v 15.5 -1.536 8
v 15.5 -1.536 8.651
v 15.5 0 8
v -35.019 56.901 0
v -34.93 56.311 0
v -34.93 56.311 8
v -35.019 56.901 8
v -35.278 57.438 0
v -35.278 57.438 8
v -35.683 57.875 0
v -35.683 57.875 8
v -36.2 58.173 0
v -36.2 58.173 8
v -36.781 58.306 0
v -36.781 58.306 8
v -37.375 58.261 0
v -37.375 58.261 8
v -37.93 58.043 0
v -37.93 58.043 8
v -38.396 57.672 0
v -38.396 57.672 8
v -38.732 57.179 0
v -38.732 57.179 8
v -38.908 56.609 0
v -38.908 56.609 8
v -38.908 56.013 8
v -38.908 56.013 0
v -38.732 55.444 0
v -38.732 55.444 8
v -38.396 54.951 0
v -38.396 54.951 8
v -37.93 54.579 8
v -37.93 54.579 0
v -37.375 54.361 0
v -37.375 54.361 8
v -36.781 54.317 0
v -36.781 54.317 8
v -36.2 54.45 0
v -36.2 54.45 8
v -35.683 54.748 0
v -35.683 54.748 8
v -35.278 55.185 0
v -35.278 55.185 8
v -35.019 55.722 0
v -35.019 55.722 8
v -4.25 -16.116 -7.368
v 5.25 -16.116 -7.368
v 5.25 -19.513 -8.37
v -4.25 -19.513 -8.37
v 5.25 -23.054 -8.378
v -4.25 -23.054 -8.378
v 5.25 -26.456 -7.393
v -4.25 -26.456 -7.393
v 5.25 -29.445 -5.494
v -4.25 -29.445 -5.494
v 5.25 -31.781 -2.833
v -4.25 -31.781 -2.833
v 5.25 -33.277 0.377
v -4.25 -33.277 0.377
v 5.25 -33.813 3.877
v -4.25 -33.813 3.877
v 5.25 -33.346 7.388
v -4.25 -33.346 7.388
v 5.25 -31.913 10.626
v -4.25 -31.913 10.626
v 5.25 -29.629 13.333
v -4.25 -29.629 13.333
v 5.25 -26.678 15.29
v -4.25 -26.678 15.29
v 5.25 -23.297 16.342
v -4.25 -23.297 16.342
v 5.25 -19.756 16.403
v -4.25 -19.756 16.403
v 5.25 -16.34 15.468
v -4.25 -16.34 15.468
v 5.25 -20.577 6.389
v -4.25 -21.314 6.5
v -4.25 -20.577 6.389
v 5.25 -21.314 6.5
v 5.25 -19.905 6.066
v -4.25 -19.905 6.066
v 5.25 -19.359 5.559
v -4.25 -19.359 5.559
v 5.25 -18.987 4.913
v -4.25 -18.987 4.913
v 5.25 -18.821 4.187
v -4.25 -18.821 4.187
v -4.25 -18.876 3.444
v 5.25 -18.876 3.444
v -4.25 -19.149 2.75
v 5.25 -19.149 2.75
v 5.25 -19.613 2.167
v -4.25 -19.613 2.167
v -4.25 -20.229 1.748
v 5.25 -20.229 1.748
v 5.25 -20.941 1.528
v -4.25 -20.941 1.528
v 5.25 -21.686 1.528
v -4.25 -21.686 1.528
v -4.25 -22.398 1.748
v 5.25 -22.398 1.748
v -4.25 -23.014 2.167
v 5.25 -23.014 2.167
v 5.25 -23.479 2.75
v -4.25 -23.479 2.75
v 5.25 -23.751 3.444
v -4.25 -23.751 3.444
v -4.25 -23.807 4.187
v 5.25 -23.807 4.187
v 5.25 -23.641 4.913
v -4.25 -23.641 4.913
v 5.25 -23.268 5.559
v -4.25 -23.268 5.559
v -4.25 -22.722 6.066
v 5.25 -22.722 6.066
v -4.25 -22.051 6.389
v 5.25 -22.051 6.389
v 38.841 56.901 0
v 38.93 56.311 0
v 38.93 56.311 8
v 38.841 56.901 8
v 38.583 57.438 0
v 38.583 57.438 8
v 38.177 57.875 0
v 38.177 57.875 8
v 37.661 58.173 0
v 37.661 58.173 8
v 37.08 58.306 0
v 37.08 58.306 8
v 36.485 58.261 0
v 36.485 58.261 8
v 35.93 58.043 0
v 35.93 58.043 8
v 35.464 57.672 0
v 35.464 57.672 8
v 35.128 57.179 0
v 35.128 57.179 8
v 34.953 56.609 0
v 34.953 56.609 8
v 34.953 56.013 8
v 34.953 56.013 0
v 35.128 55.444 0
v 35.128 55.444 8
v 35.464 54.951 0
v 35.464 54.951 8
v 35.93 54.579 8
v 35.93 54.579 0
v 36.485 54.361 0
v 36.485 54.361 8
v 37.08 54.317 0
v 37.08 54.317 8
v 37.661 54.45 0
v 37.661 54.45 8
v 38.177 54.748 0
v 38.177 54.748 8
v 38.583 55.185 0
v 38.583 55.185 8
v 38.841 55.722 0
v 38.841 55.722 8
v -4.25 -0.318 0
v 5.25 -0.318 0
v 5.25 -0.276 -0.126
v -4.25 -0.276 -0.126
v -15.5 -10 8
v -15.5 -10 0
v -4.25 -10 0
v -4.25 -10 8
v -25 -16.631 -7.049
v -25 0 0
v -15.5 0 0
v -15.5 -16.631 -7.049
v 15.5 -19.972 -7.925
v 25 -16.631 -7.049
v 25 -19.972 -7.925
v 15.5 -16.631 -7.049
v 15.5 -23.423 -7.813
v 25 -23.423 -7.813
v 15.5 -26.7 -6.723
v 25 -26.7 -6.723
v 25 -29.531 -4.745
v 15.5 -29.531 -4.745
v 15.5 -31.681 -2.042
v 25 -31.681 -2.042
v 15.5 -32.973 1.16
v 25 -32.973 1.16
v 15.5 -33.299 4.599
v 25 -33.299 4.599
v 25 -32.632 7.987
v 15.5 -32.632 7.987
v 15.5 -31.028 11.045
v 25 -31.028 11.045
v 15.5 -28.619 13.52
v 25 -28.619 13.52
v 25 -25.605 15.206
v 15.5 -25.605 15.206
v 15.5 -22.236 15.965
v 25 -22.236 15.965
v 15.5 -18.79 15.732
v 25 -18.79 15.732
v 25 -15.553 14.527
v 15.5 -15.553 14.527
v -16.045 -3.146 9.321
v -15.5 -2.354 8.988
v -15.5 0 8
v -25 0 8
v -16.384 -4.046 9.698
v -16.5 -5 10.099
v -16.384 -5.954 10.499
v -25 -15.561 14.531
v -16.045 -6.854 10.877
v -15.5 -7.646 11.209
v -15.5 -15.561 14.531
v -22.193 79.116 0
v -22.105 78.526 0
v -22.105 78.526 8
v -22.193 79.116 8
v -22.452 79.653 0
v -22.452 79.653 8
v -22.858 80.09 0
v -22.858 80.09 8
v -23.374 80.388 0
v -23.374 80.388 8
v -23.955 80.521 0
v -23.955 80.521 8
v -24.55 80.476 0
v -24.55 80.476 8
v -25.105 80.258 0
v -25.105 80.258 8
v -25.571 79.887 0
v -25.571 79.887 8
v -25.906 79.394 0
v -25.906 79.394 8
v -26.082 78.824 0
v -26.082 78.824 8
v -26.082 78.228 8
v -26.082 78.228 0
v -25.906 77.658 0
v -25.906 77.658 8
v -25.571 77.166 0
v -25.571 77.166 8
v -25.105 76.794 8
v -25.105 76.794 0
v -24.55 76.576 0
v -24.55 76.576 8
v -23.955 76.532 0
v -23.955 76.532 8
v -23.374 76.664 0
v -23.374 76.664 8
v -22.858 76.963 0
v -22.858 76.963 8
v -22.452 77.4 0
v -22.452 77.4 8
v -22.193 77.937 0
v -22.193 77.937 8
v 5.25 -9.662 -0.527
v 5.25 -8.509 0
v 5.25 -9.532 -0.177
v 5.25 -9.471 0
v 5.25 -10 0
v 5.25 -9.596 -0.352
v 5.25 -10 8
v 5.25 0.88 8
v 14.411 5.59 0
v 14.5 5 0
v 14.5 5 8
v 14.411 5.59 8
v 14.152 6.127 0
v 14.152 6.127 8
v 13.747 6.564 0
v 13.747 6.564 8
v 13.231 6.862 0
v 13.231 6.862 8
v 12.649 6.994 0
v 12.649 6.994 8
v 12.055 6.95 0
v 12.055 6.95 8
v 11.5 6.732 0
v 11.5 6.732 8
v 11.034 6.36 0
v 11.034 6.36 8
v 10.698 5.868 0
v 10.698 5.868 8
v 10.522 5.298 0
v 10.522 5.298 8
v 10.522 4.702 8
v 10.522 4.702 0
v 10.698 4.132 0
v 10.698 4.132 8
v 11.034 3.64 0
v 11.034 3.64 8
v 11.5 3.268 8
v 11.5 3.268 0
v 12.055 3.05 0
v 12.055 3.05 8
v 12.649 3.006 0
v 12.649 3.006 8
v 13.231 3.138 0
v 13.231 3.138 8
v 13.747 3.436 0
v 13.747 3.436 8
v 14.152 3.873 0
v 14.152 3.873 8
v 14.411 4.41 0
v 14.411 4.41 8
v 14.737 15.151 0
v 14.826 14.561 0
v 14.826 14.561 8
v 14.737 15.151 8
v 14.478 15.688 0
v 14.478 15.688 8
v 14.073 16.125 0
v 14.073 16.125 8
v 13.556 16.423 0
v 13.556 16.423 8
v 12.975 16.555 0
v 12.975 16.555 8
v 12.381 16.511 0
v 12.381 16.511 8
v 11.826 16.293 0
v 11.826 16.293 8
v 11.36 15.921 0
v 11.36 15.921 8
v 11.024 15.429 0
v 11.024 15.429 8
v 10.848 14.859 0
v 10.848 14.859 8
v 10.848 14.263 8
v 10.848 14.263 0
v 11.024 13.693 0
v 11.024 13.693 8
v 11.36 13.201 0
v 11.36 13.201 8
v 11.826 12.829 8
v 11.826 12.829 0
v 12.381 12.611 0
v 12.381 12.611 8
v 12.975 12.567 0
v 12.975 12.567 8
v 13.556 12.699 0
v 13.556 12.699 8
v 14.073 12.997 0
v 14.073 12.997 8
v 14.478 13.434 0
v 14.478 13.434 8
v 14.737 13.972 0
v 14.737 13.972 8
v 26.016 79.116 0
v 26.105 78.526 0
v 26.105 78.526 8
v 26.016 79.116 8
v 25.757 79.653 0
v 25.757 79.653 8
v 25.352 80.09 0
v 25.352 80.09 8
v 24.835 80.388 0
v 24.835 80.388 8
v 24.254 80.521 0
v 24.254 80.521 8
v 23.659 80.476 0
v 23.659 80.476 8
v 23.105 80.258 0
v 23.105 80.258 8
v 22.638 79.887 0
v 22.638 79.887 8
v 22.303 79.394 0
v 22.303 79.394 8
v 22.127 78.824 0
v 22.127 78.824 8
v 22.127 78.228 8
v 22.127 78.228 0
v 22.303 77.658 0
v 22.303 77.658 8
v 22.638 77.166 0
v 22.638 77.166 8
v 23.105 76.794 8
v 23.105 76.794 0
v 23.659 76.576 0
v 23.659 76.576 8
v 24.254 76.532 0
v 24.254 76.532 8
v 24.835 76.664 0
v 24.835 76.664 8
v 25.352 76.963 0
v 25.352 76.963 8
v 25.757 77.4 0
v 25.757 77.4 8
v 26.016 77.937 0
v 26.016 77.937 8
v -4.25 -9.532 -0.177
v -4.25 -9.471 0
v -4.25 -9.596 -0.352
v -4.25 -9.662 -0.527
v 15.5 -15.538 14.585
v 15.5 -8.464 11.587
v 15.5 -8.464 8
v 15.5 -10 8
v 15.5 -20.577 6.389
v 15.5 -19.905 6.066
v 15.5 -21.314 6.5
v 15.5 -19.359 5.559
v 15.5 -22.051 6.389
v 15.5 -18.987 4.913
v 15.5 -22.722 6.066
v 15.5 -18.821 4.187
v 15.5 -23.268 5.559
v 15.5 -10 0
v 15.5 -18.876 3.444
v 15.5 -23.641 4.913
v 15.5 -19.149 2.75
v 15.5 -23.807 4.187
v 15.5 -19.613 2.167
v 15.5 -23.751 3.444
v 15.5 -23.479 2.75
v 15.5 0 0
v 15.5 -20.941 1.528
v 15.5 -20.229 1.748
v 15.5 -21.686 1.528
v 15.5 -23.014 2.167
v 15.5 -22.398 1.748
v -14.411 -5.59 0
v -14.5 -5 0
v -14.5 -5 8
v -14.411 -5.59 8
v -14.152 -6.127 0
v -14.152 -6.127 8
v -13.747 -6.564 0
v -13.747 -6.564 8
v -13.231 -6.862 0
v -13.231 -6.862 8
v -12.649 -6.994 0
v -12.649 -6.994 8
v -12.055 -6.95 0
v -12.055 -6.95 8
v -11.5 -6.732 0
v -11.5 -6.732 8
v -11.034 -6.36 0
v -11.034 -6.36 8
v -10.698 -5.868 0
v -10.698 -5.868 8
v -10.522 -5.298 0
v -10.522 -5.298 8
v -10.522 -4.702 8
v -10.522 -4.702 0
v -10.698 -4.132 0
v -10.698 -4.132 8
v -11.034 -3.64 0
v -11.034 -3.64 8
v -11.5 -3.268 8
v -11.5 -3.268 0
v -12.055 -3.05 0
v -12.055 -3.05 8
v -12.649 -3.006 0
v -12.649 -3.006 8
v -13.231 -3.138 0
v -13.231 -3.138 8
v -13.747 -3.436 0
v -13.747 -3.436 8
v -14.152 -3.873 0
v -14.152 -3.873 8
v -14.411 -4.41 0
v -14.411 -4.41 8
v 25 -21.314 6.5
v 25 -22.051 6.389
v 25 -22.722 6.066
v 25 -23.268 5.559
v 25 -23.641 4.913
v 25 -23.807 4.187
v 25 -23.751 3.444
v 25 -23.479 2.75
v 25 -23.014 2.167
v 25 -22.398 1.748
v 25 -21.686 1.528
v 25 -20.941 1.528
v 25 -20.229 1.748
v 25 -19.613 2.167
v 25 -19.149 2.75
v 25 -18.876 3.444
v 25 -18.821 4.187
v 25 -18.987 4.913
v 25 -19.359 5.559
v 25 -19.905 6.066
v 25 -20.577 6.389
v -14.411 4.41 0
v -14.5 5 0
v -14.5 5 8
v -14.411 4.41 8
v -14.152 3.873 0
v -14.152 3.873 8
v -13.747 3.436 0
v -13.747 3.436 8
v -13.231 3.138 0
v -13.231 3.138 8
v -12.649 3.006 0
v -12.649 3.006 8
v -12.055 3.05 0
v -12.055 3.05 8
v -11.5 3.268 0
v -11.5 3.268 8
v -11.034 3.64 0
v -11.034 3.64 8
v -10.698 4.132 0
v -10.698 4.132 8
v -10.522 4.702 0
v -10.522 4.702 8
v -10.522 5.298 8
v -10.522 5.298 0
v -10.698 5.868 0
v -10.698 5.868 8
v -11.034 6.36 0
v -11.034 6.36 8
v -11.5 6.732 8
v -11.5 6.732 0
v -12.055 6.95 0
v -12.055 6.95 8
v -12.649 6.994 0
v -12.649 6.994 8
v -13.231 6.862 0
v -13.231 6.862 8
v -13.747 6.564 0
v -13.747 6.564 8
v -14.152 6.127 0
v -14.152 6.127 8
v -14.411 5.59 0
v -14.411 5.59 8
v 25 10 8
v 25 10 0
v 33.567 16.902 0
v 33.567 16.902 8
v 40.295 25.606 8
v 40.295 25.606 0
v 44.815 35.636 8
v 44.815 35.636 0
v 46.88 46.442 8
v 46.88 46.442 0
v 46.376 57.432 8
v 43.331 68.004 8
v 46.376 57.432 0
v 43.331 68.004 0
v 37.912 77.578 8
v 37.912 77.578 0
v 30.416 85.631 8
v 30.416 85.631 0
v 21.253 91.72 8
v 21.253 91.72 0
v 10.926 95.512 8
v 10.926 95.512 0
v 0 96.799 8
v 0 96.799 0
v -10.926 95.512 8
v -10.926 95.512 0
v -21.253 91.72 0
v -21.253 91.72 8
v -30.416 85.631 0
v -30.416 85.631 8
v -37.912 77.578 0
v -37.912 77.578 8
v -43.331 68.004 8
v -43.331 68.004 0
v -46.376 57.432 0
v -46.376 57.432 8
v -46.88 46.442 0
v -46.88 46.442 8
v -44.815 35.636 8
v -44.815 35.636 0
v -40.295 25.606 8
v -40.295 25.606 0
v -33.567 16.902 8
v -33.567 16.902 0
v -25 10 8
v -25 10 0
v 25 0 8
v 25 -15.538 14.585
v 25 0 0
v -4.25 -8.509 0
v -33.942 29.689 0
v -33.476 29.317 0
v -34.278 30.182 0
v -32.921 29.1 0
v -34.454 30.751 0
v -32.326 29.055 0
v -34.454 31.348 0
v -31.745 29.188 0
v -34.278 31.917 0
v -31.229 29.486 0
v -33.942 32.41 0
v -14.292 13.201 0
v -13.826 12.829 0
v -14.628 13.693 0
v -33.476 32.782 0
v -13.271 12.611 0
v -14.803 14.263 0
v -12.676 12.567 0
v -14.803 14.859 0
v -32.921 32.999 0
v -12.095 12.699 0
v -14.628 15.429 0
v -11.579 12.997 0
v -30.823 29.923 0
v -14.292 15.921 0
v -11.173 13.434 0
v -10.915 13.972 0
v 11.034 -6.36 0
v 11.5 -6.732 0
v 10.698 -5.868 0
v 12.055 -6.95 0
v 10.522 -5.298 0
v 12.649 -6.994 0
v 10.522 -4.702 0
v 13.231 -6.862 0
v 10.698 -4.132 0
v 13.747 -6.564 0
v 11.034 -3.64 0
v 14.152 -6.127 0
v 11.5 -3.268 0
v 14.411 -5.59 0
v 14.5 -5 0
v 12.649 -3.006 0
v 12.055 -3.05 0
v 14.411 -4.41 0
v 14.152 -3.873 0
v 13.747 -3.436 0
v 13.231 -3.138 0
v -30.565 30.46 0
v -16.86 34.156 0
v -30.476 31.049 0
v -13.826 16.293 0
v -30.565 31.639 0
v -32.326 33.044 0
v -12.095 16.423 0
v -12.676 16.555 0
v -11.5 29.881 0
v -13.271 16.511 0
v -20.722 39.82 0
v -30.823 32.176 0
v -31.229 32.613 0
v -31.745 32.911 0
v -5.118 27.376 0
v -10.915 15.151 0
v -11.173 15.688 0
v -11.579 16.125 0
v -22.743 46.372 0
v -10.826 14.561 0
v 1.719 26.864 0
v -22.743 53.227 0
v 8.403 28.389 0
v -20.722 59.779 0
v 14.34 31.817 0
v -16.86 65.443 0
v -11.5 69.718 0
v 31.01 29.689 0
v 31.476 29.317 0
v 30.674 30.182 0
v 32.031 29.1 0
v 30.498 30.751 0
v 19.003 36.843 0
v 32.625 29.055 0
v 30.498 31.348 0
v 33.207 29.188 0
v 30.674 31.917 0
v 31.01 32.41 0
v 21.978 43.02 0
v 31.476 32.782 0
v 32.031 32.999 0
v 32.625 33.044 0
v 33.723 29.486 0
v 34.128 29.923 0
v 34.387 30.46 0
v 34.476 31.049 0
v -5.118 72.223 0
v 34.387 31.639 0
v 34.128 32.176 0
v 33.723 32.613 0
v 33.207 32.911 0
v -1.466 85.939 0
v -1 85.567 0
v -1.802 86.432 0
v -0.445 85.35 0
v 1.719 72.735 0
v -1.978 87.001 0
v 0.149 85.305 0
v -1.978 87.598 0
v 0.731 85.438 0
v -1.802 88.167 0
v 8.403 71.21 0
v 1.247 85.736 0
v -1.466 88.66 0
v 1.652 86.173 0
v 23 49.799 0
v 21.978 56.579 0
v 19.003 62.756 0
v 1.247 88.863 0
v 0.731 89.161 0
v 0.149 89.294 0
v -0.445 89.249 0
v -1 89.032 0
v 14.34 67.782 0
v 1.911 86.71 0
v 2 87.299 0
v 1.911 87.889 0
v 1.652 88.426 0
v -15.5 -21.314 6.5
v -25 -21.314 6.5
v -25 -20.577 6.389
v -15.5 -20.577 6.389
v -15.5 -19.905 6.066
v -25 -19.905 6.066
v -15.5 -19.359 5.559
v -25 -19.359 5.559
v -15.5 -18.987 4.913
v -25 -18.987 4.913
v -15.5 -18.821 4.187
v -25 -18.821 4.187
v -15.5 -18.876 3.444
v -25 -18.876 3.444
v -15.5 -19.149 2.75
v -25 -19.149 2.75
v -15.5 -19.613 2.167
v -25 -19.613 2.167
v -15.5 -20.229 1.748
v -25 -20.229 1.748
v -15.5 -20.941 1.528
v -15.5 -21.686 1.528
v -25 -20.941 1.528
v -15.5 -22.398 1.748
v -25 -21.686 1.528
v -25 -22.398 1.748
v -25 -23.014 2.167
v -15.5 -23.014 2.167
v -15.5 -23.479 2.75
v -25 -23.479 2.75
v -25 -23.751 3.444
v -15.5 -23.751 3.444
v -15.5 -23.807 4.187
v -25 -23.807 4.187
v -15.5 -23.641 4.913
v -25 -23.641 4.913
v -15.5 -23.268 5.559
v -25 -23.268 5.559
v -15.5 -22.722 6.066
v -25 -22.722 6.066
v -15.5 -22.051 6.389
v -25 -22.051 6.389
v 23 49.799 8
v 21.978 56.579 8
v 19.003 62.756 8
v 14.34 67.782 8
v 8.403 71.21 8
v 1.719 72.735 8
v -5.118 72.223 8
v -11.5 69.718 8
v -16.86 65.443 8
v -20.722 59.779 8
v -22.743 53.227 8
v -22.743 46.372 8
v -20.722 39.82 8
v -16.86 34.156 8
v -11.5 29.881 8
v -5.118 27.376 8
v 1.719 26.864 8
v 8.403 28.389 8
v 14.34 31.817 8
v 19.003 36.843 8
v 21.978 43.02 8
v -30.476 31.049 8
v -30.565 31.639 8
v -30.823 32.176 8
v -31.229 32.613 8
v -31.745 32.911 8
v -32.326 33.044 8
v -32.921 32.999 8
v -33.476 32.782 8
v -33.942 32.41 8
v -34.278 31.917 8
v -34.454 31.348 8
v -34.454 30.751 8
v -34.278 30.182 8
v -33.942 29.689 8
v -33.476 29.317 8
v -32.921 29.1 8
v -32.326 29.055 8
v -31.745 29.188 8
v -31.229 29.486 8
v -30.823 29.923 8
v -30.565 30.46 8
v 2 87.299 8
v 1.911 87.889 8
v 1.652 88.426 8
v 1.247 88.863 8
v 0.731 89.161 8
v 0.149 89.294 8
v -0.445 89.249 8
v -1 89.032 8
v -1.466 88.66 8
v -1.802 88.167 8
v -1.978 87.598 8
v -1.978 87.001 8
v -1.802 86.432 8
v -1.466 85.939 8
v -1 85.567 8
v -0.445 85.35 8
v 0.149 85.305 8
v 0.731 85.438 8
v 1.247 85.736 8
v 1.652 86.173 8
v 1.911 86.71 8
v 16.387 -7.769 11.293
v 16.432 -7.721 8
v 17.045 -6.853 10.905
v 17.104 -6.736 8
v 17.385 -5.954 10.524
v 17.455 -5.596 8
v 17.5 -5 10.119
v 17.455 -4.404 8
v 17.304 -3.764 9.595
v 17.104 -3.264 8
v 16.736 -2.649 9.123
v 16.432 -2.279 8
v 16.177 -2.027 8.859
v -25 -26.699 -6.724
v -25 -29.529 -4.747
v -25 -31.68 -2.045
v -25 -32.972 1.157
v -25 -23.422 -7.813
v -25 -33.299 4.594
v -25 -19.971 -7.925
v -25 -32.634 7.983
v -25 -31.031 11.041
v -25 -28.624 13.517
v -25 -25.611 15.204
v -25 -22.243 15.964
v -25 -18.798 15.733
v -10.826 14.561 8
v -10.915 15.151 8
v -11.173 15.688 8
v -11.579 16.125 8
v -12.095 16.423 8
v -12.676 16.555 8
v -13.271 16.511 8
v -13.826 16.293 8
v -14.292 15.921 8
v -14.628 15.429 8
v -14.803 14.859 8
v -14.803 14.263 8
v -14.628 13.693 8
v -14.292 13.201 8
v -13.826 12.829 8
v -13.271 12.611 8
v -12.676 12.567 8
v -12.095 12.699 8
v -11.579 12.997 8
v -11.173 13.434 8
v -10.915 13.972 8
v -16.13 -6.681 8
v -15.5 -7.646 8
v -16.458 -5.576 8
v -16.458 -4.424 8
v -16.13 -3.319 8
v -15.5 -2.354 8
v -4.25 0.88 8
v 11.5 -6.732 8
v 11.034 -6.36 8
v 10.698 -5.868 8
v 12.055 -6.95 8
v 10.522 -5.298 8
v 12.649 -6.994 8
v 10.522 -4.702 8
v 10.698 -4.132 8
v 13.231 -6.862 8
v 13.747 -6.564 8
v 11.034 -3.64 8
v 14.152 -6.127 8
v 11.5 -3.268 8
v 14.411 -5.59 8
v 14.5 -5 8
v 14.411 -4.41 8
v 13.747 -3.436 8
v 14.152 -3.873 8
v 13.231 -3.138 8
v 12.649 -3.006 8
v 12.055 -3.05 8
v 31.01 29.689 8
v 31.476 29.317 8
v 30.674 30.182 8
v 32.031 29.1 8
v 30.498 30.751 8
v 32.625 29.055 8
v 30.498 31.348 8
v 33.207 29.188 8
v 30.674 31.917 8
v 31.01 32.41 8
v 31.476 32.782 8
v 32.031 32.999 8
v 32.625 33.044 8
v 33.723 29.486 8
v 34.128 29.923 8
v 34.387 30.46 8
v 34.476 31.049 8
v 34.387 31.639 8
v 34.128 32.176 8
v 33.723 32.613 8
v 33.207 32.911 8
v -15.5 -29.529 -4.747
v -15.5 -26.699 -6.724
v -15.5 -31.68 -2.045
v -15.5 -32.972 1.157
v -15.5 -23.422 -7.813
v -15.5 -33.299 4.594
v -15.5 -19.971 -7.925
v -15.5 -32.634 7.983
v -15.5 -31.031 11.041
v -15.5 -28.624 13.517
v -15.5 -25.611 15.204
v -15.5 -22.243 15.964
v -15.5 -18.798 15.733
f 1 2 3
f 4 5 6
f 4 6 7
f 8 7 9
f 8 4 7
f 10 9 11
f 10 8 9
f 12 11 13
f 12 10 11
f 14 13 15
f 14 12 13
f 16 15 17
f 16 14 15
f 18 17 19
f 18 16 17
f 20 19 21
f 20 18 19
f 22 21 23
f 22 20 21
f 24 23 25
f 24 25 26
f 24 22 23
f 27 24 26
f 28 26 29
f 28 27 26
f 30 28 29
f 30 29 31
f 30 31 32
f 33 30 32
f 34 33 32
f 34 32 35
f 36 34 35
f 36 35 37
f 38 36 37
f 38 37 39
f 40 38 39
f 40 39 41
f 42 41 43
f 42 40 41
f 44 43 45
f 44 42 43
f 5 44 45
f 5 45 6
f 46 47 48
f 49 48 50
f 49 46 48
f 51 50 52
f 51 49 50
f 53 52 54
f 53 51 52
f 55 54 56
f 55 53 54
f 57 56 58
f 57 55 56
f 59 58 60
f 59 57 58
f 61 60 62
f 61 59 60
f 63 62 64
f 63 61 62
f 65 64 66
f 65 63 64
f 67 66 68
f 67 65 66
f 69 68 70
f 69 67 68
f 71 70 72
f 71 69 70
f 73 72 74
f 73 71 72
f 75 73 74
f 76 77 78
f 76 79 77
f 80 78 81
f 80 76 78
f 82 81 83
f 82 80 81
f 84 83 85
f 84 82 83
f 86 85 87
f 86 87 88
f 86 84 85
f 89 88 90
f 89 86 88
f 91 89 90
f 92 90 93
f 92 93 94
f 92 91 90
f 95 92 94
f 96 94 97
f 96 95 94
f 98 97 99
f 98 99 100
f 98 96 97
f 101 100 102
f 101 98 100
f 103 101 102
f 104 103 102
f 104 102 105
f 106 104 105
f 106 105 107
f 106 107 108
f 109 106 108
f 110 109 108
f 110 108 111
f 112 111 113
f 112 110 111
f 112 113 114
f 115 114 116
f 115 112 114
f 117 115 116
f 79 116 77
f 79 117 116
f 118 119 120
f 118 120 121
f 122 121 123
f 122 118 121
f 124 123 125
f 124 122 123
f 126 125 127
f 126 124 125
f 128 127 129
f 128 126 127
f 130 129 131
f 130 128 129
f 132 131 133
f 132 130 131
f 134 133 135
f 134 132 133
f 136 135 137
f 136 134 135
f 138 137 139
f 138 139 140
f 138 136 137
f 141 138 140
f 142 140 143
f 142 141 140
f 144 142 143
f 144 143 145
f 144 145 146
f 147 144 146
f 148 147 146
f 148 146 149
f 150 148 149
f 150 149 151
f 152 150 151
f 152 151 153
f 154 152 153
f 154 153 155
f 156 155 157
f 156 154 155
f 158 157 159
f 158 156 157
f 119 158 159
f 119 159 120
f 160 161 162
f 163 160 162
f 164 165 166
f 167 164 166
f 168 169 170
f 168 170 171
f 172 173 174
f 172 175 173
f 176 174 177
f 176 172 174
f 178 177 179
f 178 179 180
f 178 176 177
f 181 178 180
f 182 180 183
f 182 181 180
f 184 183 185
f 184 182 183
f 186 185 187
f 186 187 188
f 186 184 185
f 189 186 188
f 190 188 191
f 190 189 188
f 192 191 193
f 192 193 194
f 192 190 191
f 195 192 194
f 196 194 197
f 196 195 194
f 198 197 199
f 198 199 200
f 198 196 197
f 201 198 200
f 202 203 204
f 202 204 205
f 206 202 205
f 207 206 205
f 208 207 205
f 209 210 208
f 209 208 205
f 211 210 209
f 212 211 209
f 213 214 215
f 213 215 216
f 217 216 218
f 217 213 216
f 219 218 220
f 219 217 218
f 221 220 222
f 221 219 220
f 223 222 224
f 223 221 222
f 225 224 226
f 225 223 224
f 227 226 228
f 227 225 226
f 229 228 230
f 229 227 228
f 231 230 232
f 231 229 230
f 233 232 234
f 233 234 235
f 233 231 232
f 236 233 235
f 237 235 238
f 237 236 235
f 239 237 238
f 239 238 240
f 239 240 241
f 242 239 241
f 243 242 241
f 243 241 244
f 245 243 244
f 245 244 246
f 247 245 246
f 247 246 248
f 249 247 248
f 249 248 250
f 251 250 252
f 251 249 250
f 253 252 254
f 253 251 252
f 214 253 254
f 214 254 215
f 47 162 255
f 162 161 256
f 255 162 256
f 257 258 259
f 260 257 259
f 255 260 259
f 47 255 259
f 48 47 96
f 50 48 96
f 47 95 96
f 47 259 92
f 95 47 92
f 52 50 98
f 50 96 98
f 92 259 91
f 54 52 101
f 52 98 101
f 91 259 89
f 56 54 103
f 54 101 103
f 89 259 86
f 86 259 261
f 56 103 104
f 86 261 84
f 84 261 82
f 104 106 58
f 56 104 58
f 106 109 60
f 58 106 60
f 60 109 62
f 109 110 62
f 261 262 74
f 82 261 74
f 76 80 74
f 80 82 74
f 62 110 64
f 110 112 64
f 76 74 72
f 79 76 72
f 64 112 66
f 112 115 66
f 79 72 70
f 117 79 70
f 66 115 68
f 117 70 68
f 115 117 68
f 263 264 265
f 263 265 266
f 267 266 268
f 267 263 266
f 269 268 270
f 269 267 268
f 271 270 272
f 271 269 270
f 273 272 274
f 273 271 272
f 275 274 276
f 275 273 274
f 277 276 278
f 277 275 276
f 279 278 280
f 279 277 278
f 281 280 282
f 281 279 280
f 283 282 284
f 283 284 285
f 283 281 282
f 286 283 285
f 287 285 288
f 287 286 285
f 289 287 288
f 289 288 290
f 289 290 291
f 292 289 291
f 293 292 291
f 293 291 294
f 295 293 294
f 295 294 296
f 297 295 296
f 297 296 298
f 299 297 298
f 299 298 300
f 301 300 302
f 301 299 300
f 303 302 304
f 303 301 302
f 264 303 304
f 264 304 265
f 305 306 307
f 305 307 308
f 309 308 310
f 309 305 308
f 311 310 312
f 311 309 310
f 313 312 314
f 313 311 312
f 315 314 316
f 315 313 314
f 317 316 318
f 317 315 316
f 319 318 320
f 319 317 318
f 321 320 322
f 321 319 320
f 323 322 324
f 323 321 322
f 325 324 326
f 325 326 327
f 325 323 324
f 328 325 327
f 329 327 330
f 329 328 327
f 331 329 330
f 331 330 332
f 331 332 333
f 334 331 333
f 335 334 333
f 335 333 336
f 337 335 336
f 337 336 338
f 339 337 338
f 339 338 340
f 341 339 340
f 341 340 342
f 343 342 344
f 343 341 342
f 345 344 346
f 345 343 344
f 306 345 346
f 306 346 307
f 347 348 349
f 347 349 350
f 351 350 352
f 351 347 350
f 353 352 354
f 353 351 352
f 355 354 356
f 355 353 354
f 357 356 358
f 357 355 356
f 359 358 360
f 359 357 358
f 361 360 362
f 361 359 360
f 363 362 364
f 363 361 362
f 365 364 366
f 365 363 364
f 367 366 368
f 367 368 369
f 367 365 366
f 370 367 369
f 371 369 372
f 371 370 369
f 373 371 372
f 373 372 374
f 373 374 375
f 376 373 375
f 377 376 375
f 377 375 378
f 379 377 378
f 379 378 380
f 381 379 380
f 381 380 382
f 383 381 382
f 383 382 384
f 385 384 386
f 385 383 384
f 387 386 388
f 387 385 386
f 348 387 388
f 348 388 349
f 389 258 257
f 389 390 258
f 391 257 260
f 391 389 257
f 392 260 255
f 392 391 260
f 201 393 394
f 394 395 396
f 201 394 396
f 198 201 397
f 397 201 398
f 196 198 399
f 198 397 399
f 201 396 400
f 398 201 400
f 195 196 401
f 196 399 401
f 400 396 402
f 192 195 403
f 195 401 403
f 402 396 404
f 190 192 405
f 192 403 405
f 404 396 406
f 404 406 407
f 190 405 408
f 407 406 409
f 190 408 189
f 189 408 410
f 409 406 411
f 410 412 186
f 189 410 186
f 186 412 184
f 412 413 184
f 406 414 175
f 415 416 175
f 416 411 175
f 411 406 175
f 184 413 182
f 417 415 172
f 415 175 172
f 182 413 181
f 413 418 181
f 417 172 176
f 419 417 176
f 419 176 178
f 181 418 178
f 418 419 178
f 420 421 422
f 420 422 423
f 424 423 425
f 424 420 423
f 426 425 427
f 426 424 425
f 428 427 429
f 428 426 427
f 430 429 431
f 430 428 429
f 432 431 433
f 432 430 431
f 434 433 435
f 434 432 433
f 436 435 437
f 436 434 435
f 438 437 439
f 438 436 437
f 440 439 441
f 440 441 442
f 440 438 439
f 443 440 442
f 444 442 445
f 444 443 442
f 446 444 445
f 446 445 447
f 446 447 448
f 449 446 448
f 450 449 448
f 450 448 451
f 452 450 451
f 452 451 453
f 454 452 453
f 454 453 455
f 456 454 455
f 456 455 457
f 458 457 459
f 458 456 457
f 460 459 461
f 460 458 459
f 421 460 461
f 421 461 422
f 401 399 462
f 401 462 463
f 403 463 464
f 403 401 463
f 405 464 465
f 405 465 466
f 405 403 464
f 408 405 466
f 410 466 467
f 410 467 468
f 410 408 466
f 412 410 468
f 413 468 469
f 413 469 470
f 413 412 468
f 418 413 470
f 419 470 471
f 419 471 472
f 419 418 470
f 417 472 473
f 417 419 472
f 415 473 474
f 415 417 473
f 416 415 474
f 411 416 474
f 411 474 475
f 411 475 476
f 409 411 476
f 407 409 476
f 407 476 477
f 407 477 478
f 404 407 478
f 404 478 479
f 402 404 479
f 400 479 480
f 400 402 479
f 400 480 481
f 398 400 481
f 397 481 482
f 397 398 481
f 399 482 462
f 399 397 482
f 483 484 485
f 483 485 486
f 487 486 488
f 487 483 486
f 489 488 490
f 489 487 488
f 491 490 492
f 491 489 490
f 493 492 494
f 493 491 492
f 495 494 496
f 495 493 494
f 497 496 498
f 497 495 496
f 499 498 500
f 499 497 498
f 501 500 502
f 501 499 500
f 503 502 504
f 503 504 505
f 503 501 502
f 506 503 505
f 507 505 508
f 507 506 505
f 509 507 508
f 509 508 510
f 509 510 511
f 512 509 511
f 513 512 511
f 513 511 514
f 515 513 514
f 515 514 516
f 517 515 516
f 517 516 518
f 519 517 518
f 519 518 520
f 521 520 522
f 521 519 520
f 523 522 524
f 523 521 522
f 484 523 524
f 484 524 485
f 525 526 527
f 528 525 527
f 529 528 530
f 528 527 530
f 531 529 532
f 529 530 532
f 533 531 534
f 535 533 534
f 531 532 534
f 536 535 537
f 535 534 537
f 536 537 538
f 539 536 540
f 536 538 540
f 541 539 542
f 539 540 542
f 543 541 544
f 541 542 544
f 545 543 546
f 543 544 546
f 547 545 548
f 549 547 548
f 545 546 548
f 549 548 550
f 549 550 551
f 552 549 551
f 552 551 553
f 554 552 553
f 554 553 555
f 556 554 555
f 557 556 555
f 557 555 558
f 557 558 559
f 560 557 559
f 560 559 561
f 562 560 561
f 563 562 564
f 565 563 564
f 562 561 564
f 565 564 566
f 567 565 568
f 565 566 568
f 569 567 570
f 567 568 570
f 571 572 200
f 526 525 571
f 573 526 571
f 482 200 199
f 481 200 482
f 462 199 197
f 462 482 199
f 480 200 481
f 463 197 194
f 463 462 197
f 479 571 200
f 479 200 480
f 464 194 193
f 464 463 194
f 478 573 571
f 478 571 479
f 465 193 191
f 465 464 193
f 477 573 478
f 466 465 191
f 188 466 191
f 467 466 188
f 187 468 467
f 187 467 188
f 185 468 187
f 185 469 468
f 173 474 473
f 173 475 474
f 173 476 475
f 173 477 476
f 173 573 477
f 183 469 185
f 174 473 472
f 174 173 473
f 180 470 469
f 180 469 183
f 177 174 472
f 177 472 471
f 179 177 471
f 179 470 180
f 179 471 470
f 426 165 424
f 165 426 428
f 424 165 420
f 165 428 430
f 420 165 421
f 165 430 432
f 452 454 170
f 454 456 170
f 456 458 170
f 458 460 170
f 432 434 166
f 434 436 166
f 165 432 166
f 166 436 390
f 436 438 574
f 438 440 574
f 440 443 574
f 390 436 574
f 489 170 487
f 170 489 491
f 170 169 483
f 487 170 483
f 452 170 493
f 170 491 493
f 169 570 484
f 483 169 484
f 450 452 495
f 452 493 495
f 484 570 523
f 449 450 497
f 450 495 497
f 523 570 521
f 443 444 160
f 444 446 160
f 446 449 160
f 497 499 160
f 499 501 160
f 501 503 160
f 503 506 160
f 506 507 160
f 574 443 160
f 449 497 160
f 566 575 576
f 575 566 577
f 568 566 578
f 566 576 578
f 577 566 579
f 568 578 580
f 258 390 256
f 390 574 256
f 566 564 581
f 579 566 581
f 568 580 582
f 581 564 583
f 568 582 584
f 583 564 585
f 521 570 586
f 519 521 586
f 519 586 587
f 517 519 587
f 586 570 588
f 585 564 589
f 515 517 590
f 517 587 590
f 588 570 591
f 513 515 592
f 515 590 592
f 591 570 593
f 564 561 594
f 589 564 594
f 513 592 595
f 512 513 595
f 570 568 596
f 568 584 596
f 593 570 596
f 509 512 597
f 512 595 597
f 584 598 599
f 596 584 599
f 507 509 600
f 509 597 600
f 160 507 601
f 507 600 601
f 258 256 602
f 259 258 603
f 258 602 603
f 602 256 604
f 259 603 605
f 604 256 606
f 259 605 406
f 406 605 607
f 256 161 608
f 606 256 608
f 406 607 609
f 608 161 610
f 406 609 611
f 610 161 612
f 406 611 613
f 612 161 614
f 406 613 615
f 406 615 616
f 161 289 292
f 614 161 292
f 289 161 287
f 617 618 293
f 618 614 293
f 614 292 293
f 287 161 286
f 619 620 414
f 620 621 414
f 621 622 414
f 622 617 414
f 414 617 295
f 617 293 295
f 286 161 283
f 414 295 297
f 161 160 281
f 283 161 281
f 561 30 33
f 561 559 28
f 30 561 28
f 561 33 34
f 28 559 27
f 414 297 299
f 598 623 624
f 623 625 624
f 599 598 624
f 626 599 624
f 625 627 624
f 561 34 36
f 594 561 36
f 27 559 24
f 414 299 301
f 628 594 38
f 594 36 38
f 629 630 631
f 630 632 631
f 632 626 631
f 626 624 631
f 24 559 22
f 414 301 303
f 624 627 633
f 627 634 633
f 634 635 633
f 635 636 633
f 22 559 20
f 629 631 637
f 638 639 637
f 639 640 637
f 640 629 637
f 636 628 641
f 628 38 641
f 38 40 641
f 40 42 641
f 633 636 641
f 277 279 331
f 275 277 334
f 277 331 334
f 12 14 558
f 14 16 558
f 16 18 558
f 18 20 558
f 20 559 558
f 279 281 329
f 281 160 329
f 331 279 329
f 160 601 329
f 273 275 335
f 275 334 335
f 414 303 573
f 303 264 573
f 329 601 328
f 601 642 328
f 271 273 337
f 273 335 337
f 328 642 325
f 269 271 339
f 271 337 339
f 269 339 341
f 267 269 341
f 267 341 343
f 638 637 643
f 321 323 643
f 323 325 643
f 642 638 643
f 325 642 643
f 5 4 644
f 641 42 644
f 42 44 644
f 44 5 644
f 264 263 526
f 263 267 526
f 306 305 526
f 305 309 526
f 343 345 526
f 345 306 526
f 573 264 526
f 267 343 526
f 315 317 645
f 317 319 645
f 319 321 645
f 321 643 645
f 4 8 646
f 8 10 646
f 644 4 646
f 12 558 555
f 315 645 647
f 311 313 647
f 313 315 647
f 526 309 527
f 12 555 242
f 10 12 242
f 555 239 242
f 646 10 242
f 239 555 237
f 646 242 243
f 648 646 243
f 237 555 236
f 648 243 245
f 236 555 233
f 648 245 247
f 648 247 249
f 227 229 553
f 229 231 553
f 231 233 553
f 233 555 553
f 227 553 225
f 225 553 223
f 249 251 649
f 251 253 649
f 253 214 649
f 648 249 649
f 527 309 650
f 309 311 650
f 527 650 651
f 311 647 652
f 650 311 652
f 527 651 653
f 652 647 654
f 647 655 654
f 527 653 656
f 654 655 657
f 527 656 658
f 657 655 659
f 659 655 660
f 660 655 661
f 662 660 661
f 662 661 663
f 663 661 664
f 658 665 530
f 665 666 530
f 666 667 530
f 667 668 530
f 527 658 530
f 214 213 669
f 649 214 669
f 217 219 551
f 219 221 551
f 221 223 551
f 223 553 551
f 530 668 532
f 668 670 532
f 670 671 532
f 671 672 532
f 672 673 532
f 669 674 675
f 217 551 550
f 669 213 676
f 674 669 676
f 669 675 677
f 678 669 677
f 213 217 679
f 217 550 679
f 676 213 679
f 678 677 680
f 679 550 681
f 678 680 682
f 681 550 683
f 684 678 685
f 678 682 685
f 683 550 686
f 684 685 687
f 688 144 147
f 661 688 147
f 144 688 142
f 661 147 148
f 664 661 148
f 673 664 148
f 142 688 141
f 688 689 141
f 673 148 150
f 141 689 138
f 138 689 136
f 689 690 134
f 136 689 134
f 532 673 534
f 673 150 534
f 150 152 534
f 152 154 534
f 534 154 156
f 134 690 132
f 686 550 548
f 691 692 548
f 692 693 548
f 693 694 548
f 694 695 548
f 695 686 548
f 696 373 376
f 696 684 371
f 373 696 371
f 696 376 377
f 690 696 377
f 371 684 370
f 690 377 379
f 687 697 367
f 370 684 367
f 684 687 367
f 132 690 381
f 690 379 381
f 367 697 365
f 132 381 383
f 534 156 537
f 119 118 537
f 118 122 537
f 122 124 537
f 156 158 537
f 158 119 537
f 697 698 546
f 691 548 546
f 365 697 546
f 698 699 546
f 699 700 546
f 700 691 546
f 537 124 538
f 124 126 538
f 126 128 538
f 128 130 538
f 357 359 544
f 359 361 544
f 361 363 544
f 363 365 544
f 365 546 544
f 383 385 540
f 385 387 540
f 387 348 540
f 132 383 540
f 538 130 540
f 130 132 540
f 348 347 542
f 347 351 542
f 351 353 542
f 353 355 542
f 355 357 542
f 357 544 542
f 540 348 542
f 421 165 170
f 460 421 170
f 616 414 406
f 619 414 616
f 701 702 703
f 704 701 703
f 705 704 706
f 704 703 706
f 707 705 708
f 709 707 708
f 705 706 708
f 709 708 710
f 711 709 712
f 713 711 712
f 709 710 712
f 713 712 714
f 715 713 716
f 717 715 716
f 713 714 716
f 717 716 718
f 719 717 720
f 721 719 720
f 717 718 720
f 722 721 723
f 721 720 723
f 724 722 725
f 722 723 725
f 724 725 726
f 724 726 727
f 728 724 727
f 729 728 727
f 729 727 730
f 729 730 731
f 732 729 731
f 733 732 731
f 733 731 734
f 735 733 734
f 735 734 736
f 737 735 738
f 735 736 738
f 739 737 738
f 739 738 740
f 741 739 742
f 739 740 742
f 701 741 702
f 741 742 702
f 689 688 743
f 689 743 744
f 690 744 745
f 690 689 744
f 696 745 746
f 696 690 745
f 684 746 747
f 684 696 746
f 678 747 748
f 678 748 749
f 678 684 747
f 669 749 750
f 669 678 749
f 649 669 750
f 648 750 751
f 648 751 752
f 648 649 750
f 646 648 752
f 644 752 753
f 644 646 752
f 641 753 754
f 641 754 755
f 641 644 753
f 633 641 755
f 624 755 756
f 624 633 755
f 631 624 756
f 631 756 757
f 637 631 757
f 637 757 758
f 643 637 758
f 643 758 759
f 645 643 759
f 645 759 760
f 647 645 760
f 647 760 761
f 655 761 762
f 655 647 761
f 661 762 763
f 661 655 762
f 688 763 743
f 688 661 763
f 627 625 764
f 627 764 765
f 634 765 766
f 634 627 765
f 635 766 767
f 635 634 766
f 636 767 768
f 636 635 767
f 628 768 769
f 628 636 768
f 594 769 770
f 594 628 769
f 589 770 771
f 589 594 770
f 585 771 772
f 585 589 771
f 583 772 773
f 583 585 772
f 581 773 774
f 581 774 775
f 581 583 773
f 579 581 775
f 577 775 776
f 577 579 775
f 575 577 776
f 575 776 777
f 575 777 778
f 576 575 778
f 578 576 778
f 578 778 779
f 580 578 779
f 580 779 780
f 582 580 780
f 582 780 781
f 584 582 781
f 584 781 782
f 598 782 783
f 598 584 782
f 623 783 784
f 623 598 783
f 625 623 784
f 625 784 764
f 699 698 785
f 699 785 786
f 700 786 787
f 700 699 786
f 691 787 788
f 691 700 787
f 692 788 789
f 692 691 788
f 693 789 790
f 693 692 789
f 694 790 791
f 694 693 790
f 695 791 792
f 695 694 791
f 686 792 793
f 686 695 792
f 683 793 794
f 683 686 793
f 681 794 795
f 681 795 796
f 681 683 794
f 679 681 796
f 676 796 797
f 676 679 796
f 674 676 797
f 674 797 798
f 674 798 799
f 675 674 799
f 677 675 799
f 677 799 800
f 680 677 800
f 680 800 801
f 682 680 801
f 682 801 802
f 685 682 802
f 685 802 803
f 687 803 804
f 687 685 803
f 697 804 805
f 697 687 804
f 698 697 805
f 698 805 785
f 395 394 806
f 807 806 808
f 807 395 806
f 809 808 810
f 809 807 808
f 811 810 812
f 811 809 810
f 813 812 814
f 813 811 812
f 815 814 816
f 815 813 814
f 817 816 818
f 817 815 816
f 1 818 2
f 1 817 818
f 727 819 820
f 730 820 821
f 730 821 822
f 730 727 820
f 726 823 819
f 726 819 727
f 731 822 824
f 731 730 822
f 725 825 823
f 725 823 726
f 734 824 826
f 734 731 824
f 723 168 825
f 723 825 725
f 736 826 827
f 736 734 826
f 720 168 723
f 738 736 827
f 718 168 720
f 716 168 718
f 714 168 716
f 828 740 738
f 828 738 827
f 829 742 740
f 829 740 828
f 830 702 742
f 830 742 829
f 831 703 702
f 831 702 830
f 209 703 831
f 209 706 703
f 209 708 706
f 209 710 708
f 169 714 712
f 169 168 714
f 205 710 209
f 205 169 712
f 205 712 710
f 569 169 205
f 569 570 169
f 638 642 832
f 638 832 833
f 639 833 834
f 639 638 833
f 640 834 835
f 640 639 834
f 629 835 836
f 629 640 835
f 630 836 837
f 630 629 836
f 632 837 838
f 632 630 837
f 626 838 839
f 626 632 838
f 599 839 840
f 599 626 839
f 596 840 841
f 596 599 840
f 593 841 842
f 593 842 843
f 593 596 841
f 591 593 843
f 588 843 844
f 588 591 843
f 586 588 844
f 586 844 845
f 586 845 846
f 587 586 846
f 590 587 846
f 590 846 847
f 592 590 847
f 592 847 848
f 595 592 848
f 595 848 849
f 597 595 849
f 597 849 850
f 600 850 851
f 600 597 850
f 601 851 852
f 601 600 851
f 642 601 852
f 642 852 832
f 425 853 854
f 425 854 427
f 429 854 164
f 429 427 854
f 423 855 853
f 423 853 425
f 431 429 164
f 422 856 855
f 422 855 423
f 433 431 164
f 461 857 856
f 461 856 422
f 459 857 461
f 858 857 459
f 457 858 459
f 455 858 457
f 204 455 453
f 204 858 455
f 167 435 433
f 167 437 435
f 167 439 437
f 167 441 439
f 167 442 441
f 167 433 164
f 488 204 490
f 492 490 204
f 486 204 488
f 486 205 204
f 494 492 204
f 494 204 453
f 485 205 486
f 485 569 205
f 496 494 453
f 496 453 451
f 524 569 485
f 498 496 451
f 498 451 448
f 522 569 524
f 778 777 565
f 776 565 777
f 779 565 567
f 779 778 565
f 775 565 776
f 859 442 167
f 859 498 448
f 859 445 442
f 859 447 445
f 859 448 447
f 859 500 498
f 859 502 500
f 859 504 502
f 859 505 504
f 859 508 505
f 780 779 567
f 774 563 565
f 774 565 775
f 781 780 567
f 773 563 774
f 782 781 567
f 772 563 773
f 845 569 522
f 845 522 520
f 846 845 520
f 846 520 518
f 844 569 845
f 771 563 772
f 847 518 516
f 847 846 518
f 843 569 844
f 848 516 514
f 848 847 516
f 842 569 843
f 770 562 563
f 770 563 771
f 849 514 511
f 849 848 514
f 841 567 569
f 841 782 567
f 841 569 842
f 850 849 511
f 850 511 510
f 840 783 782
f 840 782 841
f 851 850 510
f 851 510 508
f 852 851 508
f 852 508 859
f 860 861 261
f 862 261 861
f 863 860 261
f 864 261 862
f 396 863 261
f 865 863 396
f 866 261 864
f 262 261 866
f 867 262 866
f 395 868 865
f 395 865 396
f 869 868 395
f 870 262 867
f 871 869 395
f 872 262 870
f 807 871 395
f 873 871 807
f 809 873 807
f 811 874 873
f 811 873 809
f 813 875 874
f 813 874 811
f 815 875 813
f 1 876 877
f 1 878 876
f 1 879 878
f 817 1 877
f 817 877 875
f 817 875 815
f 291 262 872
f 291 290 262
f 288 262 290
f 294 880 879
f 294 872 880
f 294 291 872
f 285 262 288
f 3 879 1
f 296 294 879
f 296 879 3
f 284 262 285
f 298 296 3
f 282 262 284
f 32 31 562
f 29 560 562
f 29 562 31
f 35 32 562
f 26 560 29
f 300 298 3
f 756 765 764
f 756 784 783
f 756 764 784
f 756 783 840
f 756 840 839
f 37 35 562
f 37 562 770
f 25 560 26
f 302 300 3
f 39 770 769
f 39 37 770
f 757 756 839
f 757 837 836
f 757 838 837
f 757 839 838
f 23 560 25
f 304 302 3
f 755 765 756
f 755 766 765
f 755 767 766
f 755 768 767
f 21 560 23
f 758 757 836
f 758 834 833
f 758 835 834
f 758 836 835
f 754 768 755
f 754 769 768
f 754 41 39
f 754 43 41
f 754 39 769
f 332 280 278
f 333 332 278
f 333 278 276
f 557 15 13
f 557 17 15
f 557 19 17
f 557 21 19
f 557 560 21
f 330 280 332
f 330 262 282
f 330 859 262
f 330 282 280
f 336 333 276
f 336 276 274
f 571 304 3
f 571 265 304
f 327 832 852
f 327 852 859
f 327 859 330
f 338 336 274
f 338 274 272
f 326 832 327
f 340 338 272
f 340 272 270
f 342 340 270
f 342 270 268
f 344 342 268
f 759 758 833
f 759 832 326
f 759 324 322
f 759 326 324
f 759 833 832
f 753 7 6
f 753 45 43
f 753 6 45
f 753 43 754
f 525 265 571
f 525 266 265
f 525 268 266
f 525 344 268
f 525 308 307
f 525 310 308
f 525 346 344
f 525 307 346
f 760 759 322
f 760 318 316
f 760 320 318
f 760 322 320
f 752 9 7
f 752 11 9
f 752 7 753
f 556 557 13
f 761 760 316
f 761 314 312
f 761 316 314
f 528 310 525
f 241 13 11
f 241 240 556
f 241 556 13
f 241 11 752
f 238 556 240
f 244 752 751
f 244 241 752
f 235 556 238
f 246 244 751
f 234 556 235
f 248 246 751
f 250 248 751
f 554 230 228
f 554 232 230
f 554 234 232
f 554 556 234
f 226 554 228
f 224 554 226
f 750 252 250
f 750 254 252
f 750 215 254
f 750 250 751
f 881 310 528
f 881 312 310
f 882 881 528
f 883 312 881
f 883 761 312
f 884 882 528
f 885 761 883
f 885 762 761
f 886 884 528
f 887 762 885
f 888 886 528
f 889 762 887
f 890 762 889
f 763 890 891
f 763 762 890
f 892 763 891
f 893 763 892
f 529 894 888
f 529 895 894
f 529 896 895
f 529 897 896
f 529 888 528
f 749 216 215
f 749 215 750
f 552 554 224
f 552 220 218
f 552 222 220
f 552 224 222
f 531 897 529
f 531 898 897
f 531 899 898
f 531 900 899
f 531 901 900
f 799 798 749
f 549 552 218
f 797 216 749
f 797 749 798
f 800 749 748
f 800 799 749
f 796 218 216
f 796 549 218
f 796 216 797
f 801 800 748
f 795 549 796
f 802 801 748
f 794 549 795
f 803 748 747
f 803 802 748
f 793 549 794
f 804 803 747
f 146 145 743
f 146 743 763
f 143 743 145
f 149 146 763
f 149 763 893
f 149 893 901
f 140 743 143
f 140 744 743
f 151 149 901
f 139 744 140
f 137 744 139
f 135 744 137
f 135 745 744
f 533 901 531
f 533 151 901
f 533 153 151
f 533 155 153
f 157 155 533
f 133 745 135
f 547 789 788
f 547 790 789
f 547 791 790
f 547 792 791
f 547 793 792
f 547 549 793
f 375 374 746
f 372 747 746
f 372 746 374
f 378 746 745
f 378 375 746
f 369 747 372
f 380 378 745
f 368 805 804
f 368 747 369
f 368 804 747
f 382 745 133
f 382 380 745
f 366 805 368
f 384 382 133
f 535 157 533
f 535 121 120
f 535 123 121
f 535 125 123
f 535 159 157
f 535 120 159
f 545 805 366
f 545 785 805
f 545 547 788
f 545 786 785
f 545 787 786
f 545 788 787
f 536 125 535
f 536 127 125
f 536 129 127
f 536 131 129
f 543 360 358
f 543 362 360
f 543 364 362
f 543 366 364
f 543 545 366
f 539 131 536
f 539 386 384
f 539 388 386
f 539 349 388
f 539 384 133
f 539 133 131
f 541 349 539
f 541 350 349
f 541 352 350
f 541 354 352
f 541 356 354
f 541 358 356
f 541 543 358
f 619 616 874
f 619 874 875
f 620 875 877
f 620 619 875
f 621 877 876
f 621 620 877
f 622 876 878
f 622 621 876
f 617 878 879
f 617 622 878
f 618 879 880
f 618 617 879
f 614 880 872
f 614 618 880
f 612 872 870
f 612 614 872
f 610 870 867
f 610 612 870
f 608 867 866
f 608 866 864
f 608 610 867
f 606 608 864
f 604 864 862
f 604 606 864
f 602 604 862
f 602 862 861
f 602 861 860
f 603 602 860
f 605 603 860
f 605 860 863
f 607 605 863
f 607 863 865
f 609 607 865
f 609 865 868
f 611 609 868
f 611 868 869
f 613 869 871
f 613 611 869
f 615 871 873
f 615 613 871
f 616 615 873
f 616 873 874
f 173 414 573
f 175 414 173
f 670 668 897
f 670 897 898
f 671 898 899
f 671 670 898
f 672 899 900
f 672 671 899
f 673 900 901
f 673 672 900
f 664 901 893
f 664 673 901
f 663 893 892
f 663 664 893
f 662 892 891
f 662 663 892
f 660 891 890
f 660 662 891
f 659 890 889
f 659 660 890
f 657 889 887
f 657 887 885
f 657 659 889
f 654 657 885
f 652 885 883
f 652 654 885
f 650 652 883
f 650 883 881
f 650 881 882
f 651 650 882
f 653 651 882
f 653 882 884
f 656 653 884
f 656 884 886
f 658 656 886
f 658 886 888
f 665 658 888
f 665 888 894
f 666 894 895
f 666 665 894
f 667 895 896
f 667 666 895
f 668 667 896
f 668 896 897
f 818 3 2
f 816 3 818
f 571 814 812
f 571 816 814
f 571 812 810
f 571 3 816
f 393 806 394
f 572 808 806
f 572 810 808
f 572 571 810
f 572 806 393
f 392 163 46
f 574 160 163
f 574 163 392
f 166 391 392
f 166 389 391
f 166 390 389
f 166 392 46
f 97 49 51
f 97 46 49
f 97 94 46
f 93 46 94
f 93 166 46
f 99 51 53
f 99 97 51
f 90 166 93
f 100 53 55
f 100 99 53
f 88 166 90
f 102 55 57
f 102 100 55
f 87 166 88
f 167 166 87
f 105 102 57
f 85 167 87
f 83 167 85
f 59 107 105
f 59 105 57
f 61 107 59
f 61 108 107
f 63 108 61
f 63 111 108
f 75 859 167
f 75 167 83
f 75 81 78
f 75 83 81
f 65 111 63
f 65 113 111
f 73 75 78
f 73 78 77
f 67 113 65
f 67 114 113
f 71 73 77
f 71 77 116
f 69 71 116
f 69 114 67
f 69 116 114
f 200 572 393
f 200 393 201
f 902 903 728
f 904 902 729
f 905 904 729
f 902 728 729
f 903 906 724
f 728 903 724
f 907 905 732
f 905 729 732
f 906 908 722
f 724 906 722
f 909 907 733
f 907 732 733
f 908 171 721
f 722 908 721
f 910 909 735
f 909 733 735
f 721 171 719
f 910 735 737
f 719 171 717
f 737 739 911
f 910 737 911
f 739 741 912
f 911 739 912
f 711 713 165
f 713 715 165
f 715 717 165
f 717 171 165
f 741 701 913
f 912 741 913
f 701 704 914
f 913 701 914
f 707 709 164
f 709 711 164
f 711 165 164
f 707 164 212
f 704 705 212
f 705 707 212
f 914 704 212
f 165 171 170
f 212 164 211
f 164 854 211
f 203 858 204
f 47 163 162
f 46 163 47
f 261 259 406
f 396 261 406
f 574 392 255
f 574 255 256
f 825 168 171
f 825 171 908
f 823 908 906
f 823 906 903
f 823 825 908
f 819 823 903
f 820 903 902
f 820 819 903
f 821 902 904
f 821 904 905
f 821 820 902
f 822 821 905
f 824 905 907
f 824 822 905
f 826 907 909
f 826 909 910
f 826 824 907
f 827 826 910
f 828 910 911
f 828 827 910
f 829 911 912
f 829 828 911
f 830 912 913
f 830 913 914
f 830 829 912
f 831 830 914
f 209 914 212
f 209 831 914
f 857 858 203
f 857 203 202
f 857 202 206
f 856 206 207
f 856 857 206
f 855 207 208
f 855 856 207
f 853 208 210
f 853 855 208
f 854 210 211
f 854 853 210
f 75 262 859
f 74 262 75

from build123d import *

# Parameters (mm, degrees)
SKETCH_1_R                  = 2
SKETCH_1_R_2                = 23
EXTRUDE_1_DEPTH             = 8
SKETCH_2_R                  = 2.5
EXTRUDE_2_DEPTH             = 9.5
EXTRUDE_START               = -9.5
SKETCH_4_R                  = 2.5
EXTRUDE_4_DEPTH             = 9.5
SKETCH_6_R                  = 12.5
SKETCH_6_R_2                = 2.5
EXTRUDE_1_2_DEPTH           = 4.75
RIB_1_REACH                 = 123.764
SKETCH_7_WALL_W             = 264.861352648
SKETCH_7_WALL_H             = 9.5
EXTRUDE_5_DEPTH             = 9.5
EXTRUDE_6_DEPTH             = 9.5
CUT_EXTRUDE_3_REACH         = 110.864
SKETCH_20_R                 = 4
EXTRUDE_7_REACH             = 111.081
EXTRUDE_7_DIRECTION_2_REACH = 111.081
RIB_2_REACH                 = 123.764
SKETCH_14_WALL_W            = 263.59041227
SKETCH_14_WALL_H            = 9.5
RIB_3_REACH                 = 111.081
SKETCH_26_WALL_W            = 238.931348054
SKETCH_26_WALL_H            = 9.5


with BuildPart() as part:
    # 草图1 → Extrude 1 (new body)
    with BuildSketch(Plane.XY):
        with BuildLine():
            Line((-25, -10), (25, -10))
            Line((25, -10), (25, 10))
            ThreePointArc((25, 10), (0, 96.799497484), (-25, 10))
            Line((-25, 10), (-25, -10))
        make_face()
        with Locations((24.104535363, 78.526164101)):
            Circle(SKETCH_1_R, mode=Mode.SUBTRACT)
        with Locations((36.930290738, 56.311304147)):
            Circle(SKETCH_1_R, mode=Mode.SUBTRACT)
        with Locations((32.475952642, 31.049497484)):
            Circle(SKETCH_1_R, mode=Mode.SUBTRACT)
        with Locations((12.825755375, 14.561024205)):
            Circle(SKETCH_1_R, mode=Mode.SUBTRACT)
        with Locations((-12.825755375, 14.561024205)):
            Circle(SKETCH_1_R, mode=Mode.SUBTRACT)
        with Locations((-32.475952642, 31.049497484)):
            Circle(SKETCH_1_R, mode=Mode.SUBTRACT)
        with Locations((-36.930290738, 56.311304147)):
            Circle(SKETCH_1_R, mode=Mode.SUBTRACT)
        with Locations((-24.104535363, 78.526164101)):
            Circle(SKETCH_1_R, mode=Mode.SUBTRACT)
        with Locations((0, 87.299497484)):
            Circle(SKETCH_1_R, mode=Mode.SUBTRACT)
        with Locations((12.5, -5)):
            Circle(SKETCH_1_R, mode=Mode.SUBTRACT)
        with Locations(Location((-12.5, -5, 0), (0, 0, 180))):
            Circle(SKETCH_1_R, mode=Mode.SUBTRACT)
        with Locations((12.5, 5)):
            Circle(SKETCH_1_R, mode=Mode.SUBTRACT)
        with Locations(Location((-12.5, 5, 0), (0, 0, 180))):
            Circle(SKETCH_1_R, mode=Mode.SUBTRACT)
        with Locations((0, 49.799497484)):
            Circle(SKETCH_1_R_2, mode=Mode.SUBTRACT)
    extrude(amount=EXTRUDE_1_DEPTH)

    # 草图2 → 凸台-拉伸2 (add)
    with BuildSketch(Plane.ZY.offset(25)):
        with BuildLine():
            ThreePointArc((0, -10), (4, -33.313708499), (8, -10))
            Line((8, -10), (0, -10))
        make_face()
        with Locations((4, -21.313708499)):
            Circle(SKETCH_2_R, mode=Mode.SUBTRACT)
    extrude(amount=-EXTRUDE_2_DEPTH)

    # 草图4 → 凸台-拉伸4 (add)
    with BuildSketch(Plane(origin=(25, 0, 0), x_dir=(0, 0, -1), z_dir=(1, 0, 0)).offset(EXTRUDE_START)):
        with BuildLine():
            Line((-8, -10), (0, -10))
            ThreePointArc((0, -10), (-4, -33.313708499), (-8, -10))
        make_face()
        with Locations(Location((-4, -21.313708499, 0), (0, 0, 180))):
            Circle(SKETCH_4_R, mode=Mode.SUBTRACT)
    extrude(amount=EXTRUDE_4_DEPTH)

    # 草图6 → Extrude 1 2 (add, symmetric)
    with BuildSketch(Plane.ZY.offset(-0.5)):
        with Locations((4, -21.313708499)):
            Circle(SKETCH_6_R)
        with Locations((4, -21.313708499)):
            Circle(SKETCH_6_R_2, mode=Mode.SUBTRACT)
    extrude(amount=EXTRUDE_1_2_DEPTH, both=True)

    # 草图7 wall → 筋1 (add, up to next)
    with BuildSketch(Plane(origin=(-25, -8.913712594, 11.741206943), x_dir=(0, -0.922076341467, 0.387008036747), z_dir=(0, 0.387008036747, 0.922076341467)), mode=Mode.PRIVATE) as rib_1_sk1:
        with Locations((0, 4.75)):
            Rectangle(SKETCH_7_WALL_W, SKETCH_7_WALL_H)
    rib_1_tool1 = extrude(rib_1_sk1.sketch, amount=-RIB_1_REACH, mode=Mode.PRIVATE) - part.part
    add(rib_1_tool1.solids().sort_by_distance((-25, -8.913712594, 11.741206943))[0])

    # 草图12 → 凸台-拉伸5 (add)
    with BuildSketch(Plane(origin=(25, 0, 0), x_dir=(0, 0, -1), z_dir=(1, 0, 0))):
        Polygon((-8, 0), (-14.585289986, -15.537763557), (-9.647107703, -16.867490218), (-3.376423307, -1.94259218), align=None)
    extrude(amount=-EXTRUDE_5_DEPTH)

    # 草图15 → 凸台-拉伸6 (add)
    with BuildSketch(Plane.ZY.offset(25)):
        Polygon((0, 0), (-7.048639525, -16.631020739), (-1.081318286, -18.151978355), (5.605109172, -2.375584437), align=None)
    extrude(amount=-EXTRUDE_6_DEPTH)

    # 切除-拉伸3: up to this plane
    cut_extrude_3_end = Plane(origin=(-4.752183054, 0, 8), z_dir=(0, 0.390223979972796, 0.9207199603865396))
    # 草图20 → 切除-拉伸3 (cut, up to the surface)
    with BuildSketch(Plane.XY.offset(8), mode=Mode.PRIVATE) as cut_extrude_3_sk1:
        with Locations((-12.5, -5)):
            Circle(SKETCH_20_R)
    cut_extrude_3_tool1 = split(extrude(cut_extrude_3_sk1.sketch, amount=CUT_EXTRUDE_3_REACH, mode=Mode.PRIVATE), bisect_by=cut_extrude_3_end, keep=Keep.BOTH, mode=Mode.PRIVATE)
    add(cut_extrude_3_tool1.solids().sort_by_distance((-12.5, -5, 8))[0], mode=Mode.SUBTRACT)
    # 草图20 → 切除-拉伸3 (cut, up to the surface)
    with BuildSketch(Plane.XY.offset(8), mode=Mode.PRIVATE) as cut_extrude_3_sk2:
        with Locations((13.5, -5)):
            Circle(SKETCH_20_R)
    cut_extrude_3_tool2 = split(extrude(cut_extrude_3_sk2.sketch, amount=CUT_EXTRUDE_3_REACH, mode=Mode.PRIVATE), bisect_by=cut_extrude_3_end, keep=Keep.BOTH, mode=Mode.PRIVATE)
    add(cut_extrude_3_tool2.solids().sort_by_distance((13.5, -5, 8))[0], mode=Mode.SUBTRACT)

    # 凸台-拉伸7: up to this face of the body (flat: up to its plane)
    extrude_7_end = Plane(part.part.faces().sort_by_distance((-4.25, -9.735494608, -0.348936668))[0])
    # 草图23 → 凸台-拉伸7 (add, up to the picked face)
    with BuildSketch(Plane.ZY.offset(-0.5), mode=Mode.PRIVATE) as extrude_7_sk1:
        Polygon((3.246577314, -1.407985537), (-0.12612028, -0.27585848), (-7.368219852, -16.116249756), (-3.841621723, -16.91175555), align=None)
    extrude_7_tool1 = split(extrude(extrude_7_sk1.sketch, amount=EXTRUDE_7_REACH, mode=Mode.PRIVATE), bisect_by=extrude_7_end, keep=Keep.BOTH, mode=Mode.PRIVATE)
    add(extrude_7_tool1.solids().sort_by(Axis((0.5, -8.676237, -2.028521), (-1, 0, 0)))[0])

    # 凸台-拉伸7 direction 2: up to this face of the body (flat: up to its plane)
    extrude_7_direction_2_end = Plane(part.part.faces().sort_by_distance((5.25, -9.735494608, -0.348936668))[0])
    # 草图23 → 凸台-拉伸7 direction 2 (add, up to the picked face)
    with BuildSketch(Plane.ZY.offset(-0.5), mode=Mode.PRIVATE) as extrude_7_direction_2_sk1:
        Polygon((3.246577314, -1.407985537), (-0.12612028, -0.27585848), (-7.368219852, -16.116249756), (-3.841621723, -16.91175555), align=None)
    extrude_7_direction_2_tool1 = split(extrude(extrude_7_direction_2_sk1.sketch, amount=-EXTRUDE_7_DIRECTION_2_REACH, mode=Mode.PRIVATE), bisect_by=extrude_7_direction_2_end, keep=Keep.BOTH, mode=Mode.PRIVATE)
    add(extrude_7_direction_2_tool1.solids().sort_by(Axis((0.5, -8.676237, -2.028521), (1, 0, 0)))[0])

    # 草图14 wall → 筋2 (add, up to next)
    with BuildSketch(Plane(origin=(25, -8.31551037, -3.524319762), x_dir=(0, -0.920719960377, -0.390223979996), z_dir=(0, 0.390223979996, -0.920719960377)), mode=Mode.PRIVATE) as rib_2_sk1:
        with Locations((0, 4.75)):
            Rectangle(SKETCH_14_WALL_W, SKETCH_14_WALL_H)
    rib_2_tool1 = extrude(rib_2_sk1.sketch, amount=-RIB_2_REACH, mode=Mode.PRIVATE) - part.part
    add(rib_2_tool1.solids().sort_by_distance((25, -8.31551037, -3.524319762))[0])

    # 草图26 wall → 筋3 (add, up to next)
    with BuildSketch(Plane(origin=(0.5, -7.730285811, 11.733990841), x_dir=(0, -0.917438534624, 0.397877537927), z_dir=(0, 0.397877537927, 0.917438534624)), mode=Mode.PRIVATE) as rib_3_sk1:
        Rectangle(SKETCH_26_WALL_W, SKETCH_26_WALL_H)
    rib_3_tool1 = extrude(rib_3_sk1.sketch, amount=-RIB_3_REACH, mode=Mode.PRIVATE) - part.part
    add(rib_3_tool1.solids().sort_by_distance((0.5, -7.730285811, 11.733990841))[0])


solid = part.part
